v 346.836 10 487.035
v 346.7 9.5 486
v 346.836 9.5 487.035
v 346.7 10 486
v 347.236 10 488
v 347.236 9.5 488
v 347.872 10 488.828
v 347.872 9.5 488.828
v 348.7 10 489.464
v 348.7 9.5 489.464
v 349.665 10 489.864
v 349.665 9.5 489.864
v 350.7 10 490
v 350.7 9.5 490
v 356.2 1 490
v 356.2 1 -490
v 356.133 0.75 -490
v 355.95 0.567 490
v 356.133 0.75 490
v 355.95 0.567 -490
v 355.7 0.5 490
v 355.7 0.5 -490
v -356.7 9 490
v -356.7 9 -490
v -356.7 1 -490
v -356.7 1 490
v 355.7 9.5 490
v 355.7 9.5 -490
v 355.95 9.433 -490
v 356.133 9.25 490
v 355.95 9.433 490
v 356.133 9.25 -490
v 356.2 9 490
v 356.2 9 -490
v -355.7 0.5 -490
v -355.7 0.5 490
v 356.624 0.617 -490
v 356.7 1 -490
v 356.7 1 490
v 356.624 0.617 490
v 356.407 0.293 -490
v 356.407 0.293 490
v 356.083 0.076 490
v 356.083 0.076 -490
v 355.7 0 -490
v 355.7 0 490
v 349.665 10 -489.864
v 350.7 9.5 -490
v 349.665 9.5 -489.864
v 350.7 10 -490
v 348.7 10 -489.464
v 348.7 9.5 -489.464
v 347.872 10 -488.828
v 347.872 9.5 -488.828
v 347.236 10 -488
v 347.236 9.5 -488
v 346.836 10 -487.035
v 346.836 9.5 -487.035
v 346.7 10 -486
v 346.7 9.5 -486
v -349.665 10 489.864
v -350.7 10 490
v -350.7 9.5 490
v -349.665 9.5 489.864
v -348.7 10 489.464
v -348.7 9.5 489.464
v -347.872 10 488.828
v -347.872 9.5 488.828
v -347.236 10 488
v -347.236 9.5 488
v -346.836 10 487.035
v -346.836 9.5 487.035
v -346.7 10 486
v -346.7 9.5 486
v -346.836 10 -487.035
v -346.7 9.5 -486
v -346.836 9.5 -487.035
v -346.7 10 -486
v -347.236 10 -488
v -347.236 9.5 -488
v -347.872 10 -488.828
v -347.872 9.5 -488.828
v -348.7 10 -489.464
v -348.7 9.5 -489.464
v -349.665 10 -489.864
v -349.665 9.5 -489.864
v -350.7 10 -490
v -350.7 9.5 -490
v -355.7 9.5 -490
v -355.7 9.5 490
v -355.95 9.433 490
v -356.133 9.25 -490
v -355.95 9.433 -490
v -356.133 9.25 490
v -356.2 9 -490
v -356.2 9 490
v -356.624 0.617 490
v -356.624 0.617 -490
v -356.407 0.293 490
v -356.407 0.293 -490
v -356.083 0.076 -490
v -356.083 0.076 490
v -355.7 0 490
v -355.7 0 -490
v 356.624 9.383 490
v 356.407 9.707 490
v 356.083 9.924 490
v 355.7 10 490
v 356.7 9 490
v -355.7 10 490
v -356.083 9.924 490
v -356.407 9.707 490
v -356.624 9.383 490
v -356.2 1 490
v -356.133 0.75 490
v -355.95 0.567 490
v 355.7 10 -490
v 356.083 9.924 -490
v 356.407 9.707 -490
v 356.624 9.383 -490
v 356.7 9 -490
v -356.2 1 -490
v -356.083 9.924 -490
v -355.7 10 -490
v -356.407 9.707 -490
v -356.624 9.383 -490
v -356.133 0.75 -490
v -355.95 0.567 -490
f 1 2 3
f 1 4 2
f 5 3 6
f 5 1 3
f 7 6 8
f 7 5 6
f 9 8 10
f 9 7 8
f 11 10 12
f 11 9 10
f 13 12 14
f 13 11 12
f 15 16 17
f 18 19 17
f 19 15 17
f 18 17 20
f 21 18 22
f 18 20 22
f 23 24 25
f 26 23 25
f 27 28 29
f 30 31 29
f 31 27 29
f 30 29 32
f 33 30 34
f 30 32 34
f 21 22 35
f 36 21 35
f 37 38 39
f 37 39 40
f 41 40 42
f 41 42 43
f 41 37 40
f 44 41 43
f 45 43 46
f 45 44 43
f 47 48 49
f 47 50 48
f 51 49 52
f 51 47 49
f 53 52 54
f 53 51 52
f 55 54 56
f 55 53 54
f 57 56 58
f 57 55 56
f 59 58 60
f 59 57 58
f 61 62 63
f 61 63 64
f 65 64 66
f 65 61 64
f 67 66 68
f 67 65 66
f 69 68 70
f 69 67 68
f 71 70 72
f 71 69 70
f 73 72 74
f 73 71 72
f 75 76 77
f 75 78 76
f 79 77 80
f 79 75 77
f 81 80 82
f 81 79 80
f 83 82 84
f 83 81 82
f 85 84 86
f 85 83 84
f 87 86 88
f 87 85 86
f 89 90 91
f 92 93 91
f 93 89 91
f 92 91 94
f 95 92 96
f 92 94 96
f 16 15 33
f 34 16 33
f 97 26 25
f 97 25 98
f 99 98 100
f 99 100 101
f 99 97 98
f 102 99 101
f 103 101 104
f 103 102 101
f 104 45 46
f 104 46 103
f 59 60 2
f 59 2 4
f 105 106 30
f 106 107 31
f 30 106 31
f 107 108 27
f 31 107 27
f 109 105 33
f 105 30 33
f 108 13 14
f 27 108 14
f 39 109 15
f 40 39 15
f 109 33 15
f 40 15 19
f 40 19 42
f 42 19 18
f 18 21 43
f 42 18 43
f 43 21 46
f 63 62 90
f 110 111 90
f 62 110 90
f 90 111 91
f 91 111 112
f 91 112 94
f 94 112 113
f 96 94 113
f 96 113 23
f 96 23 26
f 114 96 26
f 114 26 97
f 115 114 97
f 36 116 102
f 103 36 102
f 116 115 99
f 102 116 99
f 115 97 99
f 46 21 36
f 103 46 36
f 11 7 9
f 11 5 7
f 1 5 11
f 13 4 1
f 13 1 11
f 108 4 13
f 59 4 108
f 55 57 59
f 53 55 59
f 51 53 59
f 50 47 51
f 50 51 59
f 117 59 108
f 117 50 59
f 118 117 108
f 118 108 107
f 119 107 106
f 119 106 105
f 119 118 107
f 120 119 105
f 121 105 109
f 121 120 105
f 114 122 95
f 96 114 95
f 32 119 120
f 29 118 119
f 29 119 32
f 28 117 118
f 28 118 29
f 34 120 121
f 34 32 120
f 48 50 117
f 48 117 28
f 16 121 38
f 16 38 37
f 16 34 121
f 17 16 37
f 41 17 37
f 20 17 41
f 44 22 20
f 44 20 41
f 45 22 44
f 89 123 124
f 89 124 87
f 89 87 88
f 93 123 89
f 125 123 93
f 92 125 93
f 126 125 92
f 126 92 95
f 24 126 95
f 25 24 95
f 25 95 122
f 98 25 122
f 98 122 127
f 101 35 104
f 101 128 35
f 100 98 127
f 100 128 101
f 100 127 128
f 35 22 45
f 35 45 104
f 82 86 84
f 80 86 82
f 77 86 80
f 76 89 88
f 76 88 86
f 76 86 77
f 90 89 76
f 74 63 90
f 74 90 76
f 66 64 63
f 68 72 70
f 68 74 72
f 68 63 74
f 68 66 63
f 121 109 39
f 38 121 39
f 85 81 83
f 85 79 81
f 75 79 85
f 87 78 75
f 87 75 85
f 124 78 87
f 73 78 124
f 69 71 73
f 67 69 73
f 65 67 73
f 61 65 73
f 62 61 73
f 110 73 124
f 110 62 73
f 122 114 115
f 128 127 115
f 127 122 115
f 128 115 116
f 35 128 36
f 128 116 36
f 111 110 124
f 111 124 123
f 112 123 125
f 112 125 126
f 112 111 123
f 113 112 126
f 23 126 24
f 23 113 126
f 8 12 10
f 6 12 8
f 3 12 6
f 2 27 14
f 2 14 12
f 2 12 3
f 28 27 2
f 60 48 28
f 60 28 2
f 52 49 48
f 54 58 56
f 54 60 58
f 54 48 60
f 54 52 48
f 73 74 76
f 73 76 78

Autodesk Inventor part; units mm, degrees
ref_plane "YZ Plane" through (0, 0, 0) normal (1, 0, 0) x (0, 1, 0)
ref_plane "XZ Plane" through (0, 0, 0) normal (0, 1, 0) x (-1, 0, 0)
ref_plane "XY Plane" through (0, 0, 0) normal (0, 0, 1) x (1, 0, 0)
sketch "Sketch6" plane through (0, 0, 0) normal (0, 1, 0) x (-1, 0, 0)
  line L0 (356.7, -490) -> (-356.7, -490)
  line L1 (-356.7, -490) -> (-356.7, 490)
  line L2 (-356.7, 490) -> (356.7, 490)
  line L3 (356.7, 490) -> (356.7, -490)
  line L4 (356.7, -490) -> (-356.7, 490) construction
  line L5 (-356.7, -490) -> (356.7, 490) construction
  point P0 (0, 0)
  dimension "d52" = 713.4
  dimension "d53" = 980
extrude "Plate2" add sketch "Sketch6" along normal blind 0.5
sketch "Sketch11" plane through (-356.2, 0, 490) normal (-1, 0, 0) x (0, -1, 0)
  line L0 (0, -980) -> (0, 0)
  line L1 (0, 0) -> (-10, 0)
  line L2 (-10, 0) -> (-10, -980)
  line L3 (-10, -980) -> (0, -980)
edge flange "Flange2" height 10 angle 90 thickness 0.5 bend radius 0.5 thickness toward (-1, 0, 0) relief tear relief width 0.5 relief depth 0.25 edges at (-356.7, 0.5, 0) wall of the first edge with corners at (-356.2, 0, -490) (-356.2, 0, 490) (-356.2, 10, 490) (-356.2, 10, -490)
bend "Bend3"
corner "Corner3"
sketch "Sketch12" plane through (-356.7, 9.5, 490) normal (0, 1, 0) x (-1, 0, 0)
  line L0 (0, -980) -> (0, 0)
  line L1 (0, 0) -> (-10, 0)
  line L2 (-10, 0) -> (-10, -980)
  line L3 (-10, -980) -> (0, -980)
edge flange "Flange3" height 10 angle 90 thickness 0.5 bend radius 0.5 thickness toward (0, 1, 0) relief tear relief width 0.5 relief depth 0.25 edges at (-356.2, 10, 0) wall of the first edge with corners at (-356.7, 9.5, -490) (-356.7, 9.5, 490) (-346.7, 9.5, 490) (-346.7, 9.5, -490)
bend "Bend4"
corner "Corner4"
sketch "Sketch13" plane through (356.2, 0, -490) normal (1, 0, 0) x (0, 1, 0)
  line L0 (0, 980) -> (0, 0)
  line L1 (0, 0) -> (10, 0)
  line L2 (10, 0) -> (10, 980)
  line L3 (10, 980) -> (0, 980)
edge flange "Flange4" height 10 angle 90 thickness 0.5 bend radius 0.5 thickness toward (1, 0, 0) relief tear relief width 0.5 relief depth 0.25 edges at (356.7, 0.5, 0) wall of the first edge with corners at (356.2, 0, 490) (356.2, 0, -490) (356.2, 10, -490) (356.2, 10, 490)
bend "Bend5"
corner "Corner5"
sketch "Sketch14" plane through (356.7, 9.5, -490) normal (0, 1, 0) x (-1, 0, 0)
  line L0 (0, 980) -> (0, 0)
  line L1 (0, 0) -> (10, 0)
  line L2 (10, 0) -> (10, 980)
  line L3 (10, 980) -> (0, 980)
edge flange "Flange5" height 10 angle 90 thickness 0.5 bend radius 0.5 thickness toward (0, 1, 0) relief tear relief width 0.5 relief depth 0.25 edges at (356.2, 10, 0) wall of the first edge with corners at (356.7, 9.5, 490) (356.7, 9.5, -490) (346.7, 9.5, -490) (346.7, 9.5, 490)
bend "Bend6"
corner "Corner6"
fillet "Corner Round1" radius 4 4 edges at (346.7, 9.75, -490) (346.7, 9.75, 490) (-346.7, 9.75, -490) (-346.7, 9.75, 490)
equation "\"d52\" = ЖАБРЫ_базовая_ширина - 2 * ЖАБРЫ_шаг_листов"
equation "\"d53\" = ЖАБРЫ_базовая_длина_кор_лист"
equation "\"d54\" = Thickness"
equation "\"d84\" = BendReliefWidth"
equation "\"d85\" = BendReliefDepth"
equation "\"d86\" = MinimumRemnant"
equation "\"d87\" = TransitionRadius"
equation "\"d90\" = BendRadius"
equation "\"d91\" = CornerReliefSize"
equation "\"d92\" = GapSize"
equation "\"d93\" = JacobiRadiusSize"
equation "\"d94\" = BendReliefWidth"
equation "\"d95\" = BendReliefDepth"
equation "\"d96\" = MinimumRemnant"
equation "\"d97\" = TransitionRadius"
equation "\"d100\" = BendRadius"
equation "\"d101\" = CornerReliefSize"
equation "\"d102\" = GapSize"
equation "\"d103\" = JacobiRadiusSize"
equation "\"d104\" = BendReliefWidth"
equation "\"d105\" = BendReliefDepth"
equation "\"d106\" = MinimumRemnant"
equation "\"d107\" = TransitionRadius"
equation "\"d110\" = BendRadius"
equation "\"d111\" = CornerReliefSize"
equation "\"d112\" = GapSize"
equation "\"d113\" = JacobiRadiusSize"
equation "\"d114\" = BendReliefWidth"
equation "\"d115\" = BendReliefDepth"
equation "\"d116\" = MinimumRemnant"
equation "\"d117\" = TransitionRadius"
equation "\"d120\" = BendRadius"
equation "\"d121\" = CornerReliefSize"
equation "\"d122\" = GapSize"
equation "\"d123\" = JacobiRadiusSize"
equation "\"BendRadius\" = Thickness"
equation "\"BendReliefWidth\" = Thickness"
equation "\"BendReliefDepth\" = 0.5 * Thickness"
equation "\"CornerReliefSize\" = 4 * Thickness"
equation "\"MinimumRemnant\" = 2 * Thickness"
equation "\"TransitionRadius\" = BendRadius"
equation "\"JacobiRadiusSize\" = BendRadius"
equation "\"GapSize\" = Thickness"
equation "\"ЖАБРЫ_базовая_ширина\" = 915"
equation "\"ЖАБРЫ_шаг_листов\" = 100.8"
equation "\"ЖАБРЫ_базовая_длина_кор_лист\" = 980"
equation "\"Thickness\" = 0.5"
properties part number "MSC 806 SHEET GILLS" material "Stainless Steel"
